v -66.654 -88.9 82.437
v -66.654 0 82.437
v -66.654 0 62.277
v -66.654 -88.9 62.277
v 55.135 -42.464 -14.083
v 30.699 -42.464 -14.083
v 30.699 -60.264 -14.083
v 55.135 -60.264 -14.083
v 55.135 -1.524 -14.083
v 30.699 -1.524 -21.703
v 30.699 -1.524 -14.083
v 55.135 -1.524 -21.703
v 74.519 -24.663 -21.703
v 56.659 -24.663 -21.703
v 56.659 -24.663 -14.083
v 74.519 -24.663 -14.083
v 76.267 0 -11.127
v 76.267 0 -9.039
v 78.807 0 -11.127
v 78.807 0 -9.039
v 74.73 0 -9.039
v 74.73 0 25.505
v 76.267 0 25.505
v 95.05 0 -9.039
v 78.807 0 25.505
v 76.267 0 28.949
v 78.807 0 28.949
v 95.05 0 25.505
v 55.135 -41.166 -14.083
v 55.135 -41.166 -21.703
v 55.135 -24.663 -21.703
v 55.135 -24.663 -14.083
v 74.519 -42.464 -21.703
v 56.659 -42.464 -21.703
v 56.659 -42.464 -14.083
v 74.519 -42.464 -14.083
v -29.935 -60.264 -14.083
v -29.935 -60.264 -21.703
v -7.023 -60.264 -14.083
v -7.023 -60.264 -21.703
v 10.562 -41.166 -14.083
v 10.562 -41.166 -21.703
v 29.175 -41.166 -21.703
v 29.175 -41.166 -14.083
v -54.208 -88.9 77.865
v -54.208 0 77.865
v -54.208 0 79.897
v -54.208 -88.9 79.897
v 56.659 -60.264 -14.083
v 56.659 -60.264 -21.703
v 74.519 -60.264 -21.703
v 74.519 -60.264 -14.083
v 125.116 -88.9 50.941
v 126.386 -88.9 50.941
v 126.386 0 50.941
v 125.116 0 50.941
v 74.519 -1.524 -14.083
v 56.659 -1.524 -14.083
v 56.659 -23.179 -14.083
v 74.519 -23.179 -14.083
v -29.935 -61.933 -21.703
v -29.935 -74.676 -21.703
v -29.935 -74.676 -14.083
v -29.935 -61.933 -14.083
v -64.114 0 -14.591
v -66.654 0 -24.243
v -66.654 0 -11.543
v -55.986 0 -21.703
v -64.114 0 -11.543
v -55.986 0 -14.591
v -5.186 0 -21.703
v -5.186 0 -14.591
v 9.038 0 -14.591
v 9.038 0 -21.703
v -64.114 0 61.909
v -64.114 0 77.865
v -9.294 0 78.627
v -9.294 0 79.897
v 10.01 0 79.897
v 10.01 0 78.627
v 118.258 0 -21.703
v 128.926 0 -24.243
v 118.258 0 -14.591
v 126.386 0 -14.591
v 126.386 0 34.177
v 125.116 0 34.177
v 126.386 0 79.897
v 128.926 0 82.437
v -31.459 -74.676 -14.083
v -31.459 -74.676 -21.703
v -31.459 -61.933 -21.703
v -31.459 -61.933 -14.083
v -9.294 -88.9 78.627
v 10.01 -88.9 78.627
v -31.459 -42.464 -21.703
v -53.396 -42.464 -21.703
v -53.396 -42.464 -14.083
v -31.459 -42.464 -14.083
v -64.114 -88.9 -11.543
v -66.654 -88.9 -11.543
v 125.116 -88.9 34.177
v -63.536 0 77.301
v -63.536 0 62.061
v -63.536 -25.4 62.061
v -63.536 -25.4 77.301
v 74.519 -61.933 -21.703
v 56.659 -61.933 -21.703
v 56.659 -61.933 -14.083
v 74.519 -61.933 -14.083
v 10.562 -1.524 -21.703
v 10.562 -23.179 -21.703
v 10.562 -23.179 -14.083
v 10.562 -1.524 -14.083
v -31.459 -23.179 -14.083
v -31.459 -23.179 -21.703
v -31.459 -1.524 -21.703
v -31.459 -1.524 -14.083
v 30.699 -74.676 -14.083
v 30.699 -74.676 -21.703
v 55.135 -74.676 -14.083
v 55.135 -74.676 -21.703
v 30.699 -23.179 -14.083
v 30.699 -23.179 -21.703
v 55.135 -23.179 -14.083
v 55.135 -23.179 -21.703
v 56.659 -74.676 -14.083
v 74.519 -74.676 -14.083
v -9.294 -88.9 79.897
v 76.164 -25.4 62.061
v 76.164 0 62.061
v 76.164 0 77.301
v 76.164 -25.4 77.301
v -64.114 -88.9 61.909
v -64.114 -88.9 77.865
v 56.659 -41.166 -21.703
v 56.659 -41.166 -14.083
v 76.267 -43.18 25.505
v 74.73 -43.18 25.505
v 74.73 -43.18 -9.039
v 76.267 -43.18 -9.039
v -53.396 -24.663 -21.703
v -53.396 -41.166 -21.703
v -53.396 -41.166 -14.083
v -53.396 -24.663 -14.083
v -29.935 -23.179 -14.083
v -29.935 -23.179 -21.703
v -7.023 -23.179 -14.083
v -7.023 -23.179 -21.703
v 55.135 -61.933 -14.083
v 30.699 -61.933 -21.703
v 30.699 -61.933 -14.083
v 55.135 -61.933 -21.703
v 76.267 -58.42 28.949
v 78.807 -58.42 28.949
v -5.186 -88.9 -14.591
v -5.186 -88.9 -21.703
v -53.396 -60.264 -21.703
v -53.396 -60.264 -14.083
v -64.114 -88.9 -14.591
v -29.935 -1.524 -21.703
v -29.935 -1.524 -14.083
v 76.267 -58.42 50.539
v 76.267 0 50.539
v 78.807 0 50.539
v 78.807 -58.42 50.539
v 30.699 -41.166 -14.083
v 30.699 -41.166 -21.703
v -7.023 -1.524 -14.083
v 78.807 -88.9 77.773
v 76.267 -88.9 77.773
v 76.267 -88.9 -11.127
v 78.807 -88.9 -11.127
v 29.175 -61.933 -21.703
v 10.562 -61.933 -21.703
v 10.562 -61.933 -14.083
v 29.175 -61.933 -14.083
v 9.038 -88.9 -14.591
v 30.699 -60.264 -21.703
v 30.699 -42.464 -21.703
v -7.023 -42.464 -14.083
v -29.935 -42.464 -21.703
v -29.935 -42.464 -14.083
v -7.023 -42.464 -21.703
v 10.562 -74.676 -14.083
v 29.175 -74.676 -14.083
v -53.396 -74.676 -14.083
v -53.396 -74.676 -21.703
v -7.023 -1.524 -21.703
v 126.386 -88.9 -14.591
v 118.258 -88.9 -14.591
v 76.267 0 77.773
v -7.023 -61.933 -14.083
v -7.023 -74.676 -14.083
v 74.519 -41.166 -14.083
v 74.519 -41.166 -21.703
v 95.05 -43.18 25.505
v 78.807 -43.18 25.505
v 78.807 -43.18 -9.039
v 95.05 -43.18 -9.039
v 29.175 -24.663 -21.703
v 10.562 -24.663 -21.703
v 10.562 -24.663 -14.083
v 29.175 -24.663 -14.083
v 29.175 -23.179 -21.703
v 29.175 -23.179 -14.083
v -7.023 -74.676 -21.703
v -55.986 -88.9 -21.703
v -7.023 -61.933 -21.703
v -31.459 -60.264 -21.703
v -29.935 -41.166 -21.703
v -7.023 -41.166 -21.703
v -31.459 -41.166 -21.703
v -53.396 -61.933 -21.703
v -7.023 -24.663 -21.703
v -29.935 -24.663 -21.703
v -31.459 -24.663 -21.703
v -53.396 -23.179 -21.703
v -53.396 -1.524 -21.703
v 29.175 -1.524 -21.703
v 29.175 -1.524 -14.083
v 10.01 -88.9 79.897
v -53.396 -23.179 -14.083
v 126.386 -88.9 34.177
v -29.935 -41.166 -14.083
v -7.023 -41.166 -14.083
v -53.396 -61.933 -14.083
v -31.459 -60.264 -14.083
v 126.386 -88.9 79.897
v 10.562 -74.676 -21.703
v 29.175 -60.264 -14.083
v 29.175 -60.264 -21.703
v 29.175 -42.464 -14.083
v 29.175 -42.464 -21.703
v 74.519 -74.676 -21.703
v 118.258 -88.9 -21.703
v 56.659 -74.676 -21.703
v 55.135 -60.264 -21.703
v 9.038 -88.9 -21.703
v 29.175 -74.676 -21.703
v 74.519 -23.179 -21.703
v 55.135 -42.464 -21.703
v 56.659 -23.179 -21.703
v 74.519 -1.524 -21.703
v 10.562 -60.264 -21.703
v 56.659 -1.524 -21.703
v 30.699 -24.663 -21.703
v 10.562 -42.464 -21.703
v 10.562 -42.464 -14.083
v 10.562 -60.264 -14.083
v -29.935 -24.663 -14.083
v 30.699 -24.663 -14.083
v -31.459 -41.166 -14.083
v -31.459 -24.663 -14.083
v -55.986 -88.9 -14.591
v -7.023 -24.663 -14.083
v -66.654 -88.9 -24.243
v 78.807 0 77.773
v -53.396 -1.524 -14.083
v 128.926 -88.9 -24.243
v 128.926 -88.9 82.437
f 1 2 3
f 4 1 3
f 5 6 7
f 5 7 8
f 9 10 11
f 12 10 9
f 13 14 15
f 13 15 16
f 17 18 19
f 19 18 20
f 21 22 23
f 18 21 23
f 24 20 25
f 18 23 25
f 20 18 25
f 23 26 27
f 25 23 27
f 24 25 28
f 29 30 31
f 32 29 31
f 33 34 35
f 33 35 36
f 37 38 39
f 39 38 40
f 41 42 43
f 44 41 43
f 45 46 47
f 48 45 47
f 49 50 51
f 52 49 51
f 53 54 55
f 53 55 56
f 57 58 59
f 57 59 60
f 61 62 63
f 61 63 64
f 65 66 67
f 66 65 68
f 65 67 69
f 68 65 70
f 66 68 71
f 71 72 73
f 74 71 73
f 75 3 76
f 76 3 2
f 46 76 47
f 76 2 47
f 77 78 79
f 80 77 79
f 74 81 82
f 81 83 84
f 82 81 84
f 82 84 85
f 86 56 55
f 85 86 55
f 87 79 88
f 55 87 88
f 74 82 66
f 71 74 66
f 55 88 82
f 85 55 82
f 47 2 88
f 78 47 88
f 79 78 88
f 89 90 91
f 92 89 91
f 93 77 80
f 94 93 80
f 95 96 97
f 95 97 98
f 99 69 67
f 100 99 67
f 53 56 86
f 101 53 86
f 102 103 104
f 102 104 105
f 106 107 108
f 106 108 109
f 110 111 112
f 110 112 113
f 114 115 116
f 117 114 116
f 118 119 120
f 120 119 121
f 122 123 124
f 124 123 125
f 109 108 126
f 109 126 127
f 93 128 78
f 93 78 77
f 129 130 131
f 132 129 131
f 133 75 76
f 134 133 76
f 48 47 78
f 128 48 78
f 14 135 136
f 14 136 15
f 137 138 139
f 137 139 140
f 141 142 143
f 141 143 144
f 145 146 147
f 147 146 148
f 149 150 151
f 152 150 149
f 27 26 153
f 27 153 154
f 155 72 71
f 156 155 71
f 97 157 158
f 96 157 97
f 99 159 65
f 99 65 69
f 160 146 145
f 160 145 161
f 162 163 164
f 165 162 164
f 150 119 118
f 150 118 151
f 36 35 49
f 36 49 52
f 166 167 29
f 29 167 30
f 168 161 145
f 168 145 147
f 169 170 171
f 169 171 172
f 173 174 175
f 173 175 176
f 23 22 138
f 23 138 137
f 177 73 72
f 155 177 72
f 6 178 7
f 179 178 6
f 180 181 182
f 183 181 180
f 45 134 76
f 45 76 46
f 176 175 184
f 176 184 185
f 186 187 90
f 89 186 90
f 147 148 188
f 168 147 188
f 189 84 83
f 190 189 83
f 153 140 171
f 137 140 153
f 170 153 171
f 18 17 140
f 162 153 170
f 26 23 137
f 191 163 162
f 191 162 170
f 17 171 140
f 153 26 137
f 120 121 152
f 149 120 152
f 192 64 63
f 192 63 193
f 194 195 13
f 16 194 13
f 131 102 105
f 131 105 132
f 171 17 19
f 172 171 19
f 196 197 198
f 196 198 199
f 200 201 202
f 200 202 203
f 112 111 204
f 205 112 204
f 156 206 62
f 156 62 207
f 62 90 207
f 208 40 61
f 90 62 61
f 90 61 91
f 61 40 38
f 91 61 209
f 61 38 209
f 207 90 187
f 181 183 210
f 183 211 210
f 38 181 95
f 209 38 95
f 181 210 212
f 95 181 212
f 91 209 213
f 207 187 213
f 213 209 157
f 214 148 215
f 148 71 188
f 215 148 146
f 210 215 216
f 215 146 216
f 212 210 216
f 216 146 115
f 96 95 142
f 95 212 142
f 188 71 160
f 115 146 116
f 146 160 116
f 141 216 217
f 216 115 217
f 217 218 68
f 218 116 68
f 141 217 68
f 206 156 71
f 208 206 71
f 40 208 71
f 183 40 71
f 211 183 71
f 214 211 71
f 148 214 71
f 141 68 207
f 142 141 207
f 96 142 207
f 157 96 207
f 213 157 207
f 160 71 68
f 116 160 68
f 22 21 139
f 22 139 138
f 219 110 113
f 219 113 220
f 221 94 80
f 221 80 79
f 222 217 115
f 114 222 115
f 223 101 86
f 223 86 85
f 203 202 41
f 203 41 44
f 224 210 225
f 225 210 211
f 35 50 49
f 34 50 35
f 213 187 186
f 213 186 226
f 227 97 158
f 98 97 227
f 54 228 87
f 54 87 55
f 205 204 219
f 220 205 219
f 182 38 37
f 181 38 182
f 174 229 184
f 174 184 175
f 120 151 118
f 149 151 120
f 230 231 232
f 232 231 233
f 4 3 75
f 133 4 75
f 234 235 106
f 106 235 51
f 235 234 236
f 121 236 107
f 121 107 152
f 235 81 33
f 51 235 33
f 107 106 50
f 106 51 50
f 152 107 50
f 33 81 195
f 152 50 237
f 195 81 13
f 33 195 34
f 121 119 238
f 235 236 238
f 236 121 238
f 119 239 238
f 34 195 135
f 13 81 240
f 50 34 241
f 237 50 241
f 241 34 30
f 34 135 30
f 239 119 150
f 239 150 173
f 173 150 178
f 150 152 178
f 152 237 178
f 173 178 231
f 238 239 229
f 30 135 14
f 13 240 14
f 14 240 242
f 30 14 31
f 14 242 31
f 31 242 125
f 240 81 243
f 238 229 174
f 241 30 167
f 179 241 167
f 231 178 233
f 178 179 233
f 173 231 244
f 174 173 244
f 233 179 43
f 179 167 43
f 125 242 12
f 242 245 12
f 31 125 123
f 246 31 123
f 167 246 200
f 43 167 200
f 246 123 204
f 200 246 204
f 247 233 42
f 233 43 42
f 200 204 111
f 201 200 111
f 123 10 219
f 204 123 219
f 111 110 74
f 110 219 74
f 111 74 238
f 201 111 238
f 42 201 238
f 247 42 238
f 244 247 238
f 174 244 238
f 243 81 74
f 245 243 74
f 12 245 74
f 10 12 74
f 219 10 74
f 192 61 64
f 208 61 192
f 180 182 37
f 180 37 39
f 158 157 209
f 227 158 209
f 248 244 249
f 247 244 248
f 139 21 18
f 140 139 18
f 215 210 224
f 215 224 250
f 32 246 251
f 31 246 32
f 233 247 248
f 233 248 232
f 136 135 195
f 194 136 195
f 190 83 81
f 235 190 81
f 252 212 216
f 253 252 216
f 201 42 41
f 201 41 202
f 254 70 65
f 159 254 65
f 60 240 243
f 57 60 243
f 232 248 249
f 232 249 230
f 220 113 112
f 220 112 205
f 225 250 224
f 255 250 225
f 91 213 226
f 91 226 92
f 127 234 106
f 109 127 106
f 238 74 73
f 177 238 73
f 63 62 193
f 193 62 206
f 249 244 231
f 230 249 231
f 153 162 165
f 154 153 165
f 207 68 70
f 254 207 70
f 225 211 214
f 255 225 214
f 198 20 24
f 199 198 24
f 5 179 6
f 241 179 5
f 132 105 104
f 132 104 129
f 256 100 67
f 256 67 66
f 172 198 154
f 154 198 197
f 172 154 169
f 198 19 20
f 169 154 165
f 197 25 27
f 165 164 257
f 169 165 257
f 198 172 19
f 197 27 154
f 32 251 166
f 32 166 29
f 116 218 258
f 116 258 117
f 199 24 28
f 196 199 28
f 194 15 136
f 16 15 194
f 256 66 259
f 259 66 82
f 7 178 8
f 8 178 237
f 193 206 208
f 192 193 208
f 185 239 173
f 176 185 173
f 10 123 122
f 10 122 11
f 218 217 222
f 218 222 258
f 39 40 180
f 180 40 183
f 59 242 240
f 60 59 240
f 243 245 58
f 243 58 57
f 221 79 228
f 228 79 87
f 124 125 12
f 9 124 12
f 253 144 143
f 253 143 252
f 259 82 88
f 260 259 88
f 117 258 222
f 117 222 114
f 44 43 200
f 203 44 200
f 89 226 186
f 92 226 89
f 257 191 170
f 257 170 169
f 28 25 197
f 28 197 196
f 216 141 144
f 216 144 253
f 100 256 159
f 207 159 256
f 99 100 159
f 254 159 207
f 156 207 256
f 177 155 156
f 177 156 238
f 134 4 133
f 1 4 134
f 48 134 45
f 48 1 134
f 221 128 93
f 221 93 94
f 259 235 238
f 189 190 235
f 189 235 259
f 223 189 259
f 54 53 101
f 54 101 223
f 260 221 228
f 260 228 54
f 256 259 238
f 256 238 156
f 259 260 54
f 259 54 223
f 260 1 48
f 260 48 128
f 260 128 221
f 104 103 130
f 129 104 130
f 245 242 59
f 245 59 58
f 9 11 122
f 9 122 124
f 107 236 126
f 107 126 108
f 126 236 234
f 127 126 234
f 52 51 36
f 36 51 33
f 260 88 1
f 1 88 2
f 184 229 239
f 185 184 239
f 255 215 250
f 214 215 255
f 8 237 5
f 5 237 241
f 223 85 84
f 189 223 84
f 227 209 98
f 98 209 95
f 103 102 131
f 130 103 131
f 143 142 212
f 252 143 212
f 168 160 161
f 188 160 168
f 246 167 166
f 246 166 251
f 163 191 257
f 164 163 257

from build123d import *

# Parameters (mm, degrees)
F5_DEPTH  = 88.9
F3_W      = 2.54
F3_H      = 88.9
F1_W      = 139.7
F1_H      = 15.24
F8_DEPTH  = 25.4
F7_W      = 5.08
F7_H      = 21.59
F9_DEPTH  = 58.42
F2_W      = 20.32
F2_H      = 34.544
F10_DEPTH = 43.18
F11_W     = 21.9367220569
F11_H     = 12.7427842925
F11_H_2   = 17.8008489311
F11_W_2   = 22.9115727548
F11_H_3   = 16.5028721094
F11_H_4   = 21.655281503
F11_W_3   = 18.6136638447
F11_W_4   = 24.4355718235
F11_W_5   = 17.8599643318
F12_DEPTH = 7.62


# Not quite as in the source:
# - a feature of the source that left no trace in its solid (it failed there, or was rolled back) is left out
# - a feature names something its author has since deleted; it is built from what else it names


with BuildPart() as f5:
    # F0 (on Front) → F5 (new body)
    with BuildSketch(Plane.XZ):
        Polygon((-54.2084437874, 77.8652965117), (-54.2084437874, 79.8972965117), (-9.2940292287, 79.8972965117), (-9.2940292287, 78.6272965117), (10.0099707713, 78.6272965117), (10.0099707713, 79.8972965117), (126.3855562126, 79.8972965117), (126.3855562126, 50.9412965117), (125.1155562126, 50.9412965117), (125.1155562126, 34.1772965117), (126.3855562126, 34.1772965117), (126.3855562126, -14.5907034883), (118.2575562126, -14.5907034883), (118.2575562126, -21.7027034883), (9.0375562126, -21.7027034883), (9.0375562126, -14.5907034883), (-5.1864437874, -14.5907034883), (-5.1864437874, -21.7027034883), (-55.9864437874, -21.7027034883), (-55.9864437874, -14.5907034883), (-64.1144437874, -14.5907034883), (-64.1144437874, -11.5427034883), (-66.6544437874, -11.5427034883), (-66.6544437874, -24.2427034883), (128.9255562126, -24.2427034883), (128.9255562126, -21.7027034883), (128.9255562126, 82.4372965117), (-66.6544437874, 82.4372965117), (-66.6544437874, 62.2772533174), (-64.1144437874, 61.9093436475), (-64.1144437874, 77.8652965117), align=None)
    extrude(amount=F5_DEPTH)

    # F11 (on face) → F12 (join)
    with BuildSketch(Plane.XY.offset(-21.7027034883)):
        with Locations((-42.4272827589, -68.3046078538)):
            Rectangle(F11_W, F11_H)
        with Locations((-42.4272827589, -51.3639580458)):
            Rectangle(F11_W, F11_H_2)
        with Locations((-18.4791353531, -51.3639580458)):
            Rectangle(F11_W_2, F11_H_2)
        with Locations((-18.4791353531, -68.3046078538)):
            Rectangle(F11_W_2, F11_H)
        with Locations((-42.4272827589, -32.9141207039)):
            Rectangle(F11_W, F11_H_3)
        with Locations((-18.4791353531, -32.9141207039)):
            Rectangle(F11_W_2, F11_H_3)
        with Locations((-18.4791353531, -12.3516407515)):
            Rectangle(F11_W_2, F11_H_4)
        with Locations((-42.4272827589, -12.3516407515)):
            Rectangle(F11_W, F11_H_4)
        with Locations((19.868388135, -32.9141207039)):
            Rectangle(F11_W_3, F11_H_3)
        with Locations((19.868388135, -51.3639580458)):
            Rectangle(F11_W_3, F11_H_2)
        with Locations((19.868388135, -68.3046078538)):
            Rectangle(F11_W_3, F11_H)
        with Locations((42.9170059691, -68.3046078538)):
            Rectangle(F11_W_4, F11_H)
        with Locations((65.5887740467, -68.3046078538)):
            Rectangle(F11_W_5, F11_H)
        with Locations((65.5887740467, -51.3639580458)):
            Rectangle(F11_W_5, F11_H_2)
        with Locations((42.9170059691, -51.3639580458)):
            Rectangle(F11_W_4, F11_H_2)
        with Locations((42.9170059691, -32.9141207039)):
            Rectangle(F11_W_4, F11_H_3)
        with Locations((65.5887740467, -32.9141207039)):
            Rectangle(F11_W_5, F11_H_3)
        with Locations((65.5887740467, -12.3516407515)):
            Rectangle(F11_W_5, F11_H_4)
        with Locations((42.9170059691, -12.3516407515)):
            Rectangle(F11_W_4, F11_H_4)
        with Locations((19.868388135, -12.3516407515)):
            Rectangle(F11_W_3, F11_H_4)
    extrude(amount=F12_DEPTH)


with BuildPart() as f5b:
    # F3 (on Front) → F5, piece 2 (new body)
    with BuildSketch(Plane.XZ):
        with Locations((77.5370186973, 33.3226016507)):
            Rectangle(F3_W, F3_H)
    extrude(amount=F5_DEPTH)

    # F7 (on Front) → F9 (cut)
    with BuildSketch(Plane.XZ):
        with Locations((77.5194165921, 39.7443948221)):
            Rectangle(F7_W, F7_H)
    extrude(amount=F9_DEPTH, mode=Mode.SUBTRACT)

    # F2 (on Front) → F10 (join)
    with BuildSketch(Plane.XZ):
        with Locations((84.8901355004, 8.2332931607)):
            Rectangle(F2_W, F2_H)
    extrude(amount=F10_DEPTH)


with BuildPart() as f8:
    # F1 (on Front) → F8 (new body)
    with BuildSketch(Plane.XZ):
        with Locations((6.3137017131, 69.6807100427)):
            Rectangle(F1_W, F1_H)
    extrude(amount=F8_DEPTH)


solid = Compound([f5.part, f5b.part, f8.part])
